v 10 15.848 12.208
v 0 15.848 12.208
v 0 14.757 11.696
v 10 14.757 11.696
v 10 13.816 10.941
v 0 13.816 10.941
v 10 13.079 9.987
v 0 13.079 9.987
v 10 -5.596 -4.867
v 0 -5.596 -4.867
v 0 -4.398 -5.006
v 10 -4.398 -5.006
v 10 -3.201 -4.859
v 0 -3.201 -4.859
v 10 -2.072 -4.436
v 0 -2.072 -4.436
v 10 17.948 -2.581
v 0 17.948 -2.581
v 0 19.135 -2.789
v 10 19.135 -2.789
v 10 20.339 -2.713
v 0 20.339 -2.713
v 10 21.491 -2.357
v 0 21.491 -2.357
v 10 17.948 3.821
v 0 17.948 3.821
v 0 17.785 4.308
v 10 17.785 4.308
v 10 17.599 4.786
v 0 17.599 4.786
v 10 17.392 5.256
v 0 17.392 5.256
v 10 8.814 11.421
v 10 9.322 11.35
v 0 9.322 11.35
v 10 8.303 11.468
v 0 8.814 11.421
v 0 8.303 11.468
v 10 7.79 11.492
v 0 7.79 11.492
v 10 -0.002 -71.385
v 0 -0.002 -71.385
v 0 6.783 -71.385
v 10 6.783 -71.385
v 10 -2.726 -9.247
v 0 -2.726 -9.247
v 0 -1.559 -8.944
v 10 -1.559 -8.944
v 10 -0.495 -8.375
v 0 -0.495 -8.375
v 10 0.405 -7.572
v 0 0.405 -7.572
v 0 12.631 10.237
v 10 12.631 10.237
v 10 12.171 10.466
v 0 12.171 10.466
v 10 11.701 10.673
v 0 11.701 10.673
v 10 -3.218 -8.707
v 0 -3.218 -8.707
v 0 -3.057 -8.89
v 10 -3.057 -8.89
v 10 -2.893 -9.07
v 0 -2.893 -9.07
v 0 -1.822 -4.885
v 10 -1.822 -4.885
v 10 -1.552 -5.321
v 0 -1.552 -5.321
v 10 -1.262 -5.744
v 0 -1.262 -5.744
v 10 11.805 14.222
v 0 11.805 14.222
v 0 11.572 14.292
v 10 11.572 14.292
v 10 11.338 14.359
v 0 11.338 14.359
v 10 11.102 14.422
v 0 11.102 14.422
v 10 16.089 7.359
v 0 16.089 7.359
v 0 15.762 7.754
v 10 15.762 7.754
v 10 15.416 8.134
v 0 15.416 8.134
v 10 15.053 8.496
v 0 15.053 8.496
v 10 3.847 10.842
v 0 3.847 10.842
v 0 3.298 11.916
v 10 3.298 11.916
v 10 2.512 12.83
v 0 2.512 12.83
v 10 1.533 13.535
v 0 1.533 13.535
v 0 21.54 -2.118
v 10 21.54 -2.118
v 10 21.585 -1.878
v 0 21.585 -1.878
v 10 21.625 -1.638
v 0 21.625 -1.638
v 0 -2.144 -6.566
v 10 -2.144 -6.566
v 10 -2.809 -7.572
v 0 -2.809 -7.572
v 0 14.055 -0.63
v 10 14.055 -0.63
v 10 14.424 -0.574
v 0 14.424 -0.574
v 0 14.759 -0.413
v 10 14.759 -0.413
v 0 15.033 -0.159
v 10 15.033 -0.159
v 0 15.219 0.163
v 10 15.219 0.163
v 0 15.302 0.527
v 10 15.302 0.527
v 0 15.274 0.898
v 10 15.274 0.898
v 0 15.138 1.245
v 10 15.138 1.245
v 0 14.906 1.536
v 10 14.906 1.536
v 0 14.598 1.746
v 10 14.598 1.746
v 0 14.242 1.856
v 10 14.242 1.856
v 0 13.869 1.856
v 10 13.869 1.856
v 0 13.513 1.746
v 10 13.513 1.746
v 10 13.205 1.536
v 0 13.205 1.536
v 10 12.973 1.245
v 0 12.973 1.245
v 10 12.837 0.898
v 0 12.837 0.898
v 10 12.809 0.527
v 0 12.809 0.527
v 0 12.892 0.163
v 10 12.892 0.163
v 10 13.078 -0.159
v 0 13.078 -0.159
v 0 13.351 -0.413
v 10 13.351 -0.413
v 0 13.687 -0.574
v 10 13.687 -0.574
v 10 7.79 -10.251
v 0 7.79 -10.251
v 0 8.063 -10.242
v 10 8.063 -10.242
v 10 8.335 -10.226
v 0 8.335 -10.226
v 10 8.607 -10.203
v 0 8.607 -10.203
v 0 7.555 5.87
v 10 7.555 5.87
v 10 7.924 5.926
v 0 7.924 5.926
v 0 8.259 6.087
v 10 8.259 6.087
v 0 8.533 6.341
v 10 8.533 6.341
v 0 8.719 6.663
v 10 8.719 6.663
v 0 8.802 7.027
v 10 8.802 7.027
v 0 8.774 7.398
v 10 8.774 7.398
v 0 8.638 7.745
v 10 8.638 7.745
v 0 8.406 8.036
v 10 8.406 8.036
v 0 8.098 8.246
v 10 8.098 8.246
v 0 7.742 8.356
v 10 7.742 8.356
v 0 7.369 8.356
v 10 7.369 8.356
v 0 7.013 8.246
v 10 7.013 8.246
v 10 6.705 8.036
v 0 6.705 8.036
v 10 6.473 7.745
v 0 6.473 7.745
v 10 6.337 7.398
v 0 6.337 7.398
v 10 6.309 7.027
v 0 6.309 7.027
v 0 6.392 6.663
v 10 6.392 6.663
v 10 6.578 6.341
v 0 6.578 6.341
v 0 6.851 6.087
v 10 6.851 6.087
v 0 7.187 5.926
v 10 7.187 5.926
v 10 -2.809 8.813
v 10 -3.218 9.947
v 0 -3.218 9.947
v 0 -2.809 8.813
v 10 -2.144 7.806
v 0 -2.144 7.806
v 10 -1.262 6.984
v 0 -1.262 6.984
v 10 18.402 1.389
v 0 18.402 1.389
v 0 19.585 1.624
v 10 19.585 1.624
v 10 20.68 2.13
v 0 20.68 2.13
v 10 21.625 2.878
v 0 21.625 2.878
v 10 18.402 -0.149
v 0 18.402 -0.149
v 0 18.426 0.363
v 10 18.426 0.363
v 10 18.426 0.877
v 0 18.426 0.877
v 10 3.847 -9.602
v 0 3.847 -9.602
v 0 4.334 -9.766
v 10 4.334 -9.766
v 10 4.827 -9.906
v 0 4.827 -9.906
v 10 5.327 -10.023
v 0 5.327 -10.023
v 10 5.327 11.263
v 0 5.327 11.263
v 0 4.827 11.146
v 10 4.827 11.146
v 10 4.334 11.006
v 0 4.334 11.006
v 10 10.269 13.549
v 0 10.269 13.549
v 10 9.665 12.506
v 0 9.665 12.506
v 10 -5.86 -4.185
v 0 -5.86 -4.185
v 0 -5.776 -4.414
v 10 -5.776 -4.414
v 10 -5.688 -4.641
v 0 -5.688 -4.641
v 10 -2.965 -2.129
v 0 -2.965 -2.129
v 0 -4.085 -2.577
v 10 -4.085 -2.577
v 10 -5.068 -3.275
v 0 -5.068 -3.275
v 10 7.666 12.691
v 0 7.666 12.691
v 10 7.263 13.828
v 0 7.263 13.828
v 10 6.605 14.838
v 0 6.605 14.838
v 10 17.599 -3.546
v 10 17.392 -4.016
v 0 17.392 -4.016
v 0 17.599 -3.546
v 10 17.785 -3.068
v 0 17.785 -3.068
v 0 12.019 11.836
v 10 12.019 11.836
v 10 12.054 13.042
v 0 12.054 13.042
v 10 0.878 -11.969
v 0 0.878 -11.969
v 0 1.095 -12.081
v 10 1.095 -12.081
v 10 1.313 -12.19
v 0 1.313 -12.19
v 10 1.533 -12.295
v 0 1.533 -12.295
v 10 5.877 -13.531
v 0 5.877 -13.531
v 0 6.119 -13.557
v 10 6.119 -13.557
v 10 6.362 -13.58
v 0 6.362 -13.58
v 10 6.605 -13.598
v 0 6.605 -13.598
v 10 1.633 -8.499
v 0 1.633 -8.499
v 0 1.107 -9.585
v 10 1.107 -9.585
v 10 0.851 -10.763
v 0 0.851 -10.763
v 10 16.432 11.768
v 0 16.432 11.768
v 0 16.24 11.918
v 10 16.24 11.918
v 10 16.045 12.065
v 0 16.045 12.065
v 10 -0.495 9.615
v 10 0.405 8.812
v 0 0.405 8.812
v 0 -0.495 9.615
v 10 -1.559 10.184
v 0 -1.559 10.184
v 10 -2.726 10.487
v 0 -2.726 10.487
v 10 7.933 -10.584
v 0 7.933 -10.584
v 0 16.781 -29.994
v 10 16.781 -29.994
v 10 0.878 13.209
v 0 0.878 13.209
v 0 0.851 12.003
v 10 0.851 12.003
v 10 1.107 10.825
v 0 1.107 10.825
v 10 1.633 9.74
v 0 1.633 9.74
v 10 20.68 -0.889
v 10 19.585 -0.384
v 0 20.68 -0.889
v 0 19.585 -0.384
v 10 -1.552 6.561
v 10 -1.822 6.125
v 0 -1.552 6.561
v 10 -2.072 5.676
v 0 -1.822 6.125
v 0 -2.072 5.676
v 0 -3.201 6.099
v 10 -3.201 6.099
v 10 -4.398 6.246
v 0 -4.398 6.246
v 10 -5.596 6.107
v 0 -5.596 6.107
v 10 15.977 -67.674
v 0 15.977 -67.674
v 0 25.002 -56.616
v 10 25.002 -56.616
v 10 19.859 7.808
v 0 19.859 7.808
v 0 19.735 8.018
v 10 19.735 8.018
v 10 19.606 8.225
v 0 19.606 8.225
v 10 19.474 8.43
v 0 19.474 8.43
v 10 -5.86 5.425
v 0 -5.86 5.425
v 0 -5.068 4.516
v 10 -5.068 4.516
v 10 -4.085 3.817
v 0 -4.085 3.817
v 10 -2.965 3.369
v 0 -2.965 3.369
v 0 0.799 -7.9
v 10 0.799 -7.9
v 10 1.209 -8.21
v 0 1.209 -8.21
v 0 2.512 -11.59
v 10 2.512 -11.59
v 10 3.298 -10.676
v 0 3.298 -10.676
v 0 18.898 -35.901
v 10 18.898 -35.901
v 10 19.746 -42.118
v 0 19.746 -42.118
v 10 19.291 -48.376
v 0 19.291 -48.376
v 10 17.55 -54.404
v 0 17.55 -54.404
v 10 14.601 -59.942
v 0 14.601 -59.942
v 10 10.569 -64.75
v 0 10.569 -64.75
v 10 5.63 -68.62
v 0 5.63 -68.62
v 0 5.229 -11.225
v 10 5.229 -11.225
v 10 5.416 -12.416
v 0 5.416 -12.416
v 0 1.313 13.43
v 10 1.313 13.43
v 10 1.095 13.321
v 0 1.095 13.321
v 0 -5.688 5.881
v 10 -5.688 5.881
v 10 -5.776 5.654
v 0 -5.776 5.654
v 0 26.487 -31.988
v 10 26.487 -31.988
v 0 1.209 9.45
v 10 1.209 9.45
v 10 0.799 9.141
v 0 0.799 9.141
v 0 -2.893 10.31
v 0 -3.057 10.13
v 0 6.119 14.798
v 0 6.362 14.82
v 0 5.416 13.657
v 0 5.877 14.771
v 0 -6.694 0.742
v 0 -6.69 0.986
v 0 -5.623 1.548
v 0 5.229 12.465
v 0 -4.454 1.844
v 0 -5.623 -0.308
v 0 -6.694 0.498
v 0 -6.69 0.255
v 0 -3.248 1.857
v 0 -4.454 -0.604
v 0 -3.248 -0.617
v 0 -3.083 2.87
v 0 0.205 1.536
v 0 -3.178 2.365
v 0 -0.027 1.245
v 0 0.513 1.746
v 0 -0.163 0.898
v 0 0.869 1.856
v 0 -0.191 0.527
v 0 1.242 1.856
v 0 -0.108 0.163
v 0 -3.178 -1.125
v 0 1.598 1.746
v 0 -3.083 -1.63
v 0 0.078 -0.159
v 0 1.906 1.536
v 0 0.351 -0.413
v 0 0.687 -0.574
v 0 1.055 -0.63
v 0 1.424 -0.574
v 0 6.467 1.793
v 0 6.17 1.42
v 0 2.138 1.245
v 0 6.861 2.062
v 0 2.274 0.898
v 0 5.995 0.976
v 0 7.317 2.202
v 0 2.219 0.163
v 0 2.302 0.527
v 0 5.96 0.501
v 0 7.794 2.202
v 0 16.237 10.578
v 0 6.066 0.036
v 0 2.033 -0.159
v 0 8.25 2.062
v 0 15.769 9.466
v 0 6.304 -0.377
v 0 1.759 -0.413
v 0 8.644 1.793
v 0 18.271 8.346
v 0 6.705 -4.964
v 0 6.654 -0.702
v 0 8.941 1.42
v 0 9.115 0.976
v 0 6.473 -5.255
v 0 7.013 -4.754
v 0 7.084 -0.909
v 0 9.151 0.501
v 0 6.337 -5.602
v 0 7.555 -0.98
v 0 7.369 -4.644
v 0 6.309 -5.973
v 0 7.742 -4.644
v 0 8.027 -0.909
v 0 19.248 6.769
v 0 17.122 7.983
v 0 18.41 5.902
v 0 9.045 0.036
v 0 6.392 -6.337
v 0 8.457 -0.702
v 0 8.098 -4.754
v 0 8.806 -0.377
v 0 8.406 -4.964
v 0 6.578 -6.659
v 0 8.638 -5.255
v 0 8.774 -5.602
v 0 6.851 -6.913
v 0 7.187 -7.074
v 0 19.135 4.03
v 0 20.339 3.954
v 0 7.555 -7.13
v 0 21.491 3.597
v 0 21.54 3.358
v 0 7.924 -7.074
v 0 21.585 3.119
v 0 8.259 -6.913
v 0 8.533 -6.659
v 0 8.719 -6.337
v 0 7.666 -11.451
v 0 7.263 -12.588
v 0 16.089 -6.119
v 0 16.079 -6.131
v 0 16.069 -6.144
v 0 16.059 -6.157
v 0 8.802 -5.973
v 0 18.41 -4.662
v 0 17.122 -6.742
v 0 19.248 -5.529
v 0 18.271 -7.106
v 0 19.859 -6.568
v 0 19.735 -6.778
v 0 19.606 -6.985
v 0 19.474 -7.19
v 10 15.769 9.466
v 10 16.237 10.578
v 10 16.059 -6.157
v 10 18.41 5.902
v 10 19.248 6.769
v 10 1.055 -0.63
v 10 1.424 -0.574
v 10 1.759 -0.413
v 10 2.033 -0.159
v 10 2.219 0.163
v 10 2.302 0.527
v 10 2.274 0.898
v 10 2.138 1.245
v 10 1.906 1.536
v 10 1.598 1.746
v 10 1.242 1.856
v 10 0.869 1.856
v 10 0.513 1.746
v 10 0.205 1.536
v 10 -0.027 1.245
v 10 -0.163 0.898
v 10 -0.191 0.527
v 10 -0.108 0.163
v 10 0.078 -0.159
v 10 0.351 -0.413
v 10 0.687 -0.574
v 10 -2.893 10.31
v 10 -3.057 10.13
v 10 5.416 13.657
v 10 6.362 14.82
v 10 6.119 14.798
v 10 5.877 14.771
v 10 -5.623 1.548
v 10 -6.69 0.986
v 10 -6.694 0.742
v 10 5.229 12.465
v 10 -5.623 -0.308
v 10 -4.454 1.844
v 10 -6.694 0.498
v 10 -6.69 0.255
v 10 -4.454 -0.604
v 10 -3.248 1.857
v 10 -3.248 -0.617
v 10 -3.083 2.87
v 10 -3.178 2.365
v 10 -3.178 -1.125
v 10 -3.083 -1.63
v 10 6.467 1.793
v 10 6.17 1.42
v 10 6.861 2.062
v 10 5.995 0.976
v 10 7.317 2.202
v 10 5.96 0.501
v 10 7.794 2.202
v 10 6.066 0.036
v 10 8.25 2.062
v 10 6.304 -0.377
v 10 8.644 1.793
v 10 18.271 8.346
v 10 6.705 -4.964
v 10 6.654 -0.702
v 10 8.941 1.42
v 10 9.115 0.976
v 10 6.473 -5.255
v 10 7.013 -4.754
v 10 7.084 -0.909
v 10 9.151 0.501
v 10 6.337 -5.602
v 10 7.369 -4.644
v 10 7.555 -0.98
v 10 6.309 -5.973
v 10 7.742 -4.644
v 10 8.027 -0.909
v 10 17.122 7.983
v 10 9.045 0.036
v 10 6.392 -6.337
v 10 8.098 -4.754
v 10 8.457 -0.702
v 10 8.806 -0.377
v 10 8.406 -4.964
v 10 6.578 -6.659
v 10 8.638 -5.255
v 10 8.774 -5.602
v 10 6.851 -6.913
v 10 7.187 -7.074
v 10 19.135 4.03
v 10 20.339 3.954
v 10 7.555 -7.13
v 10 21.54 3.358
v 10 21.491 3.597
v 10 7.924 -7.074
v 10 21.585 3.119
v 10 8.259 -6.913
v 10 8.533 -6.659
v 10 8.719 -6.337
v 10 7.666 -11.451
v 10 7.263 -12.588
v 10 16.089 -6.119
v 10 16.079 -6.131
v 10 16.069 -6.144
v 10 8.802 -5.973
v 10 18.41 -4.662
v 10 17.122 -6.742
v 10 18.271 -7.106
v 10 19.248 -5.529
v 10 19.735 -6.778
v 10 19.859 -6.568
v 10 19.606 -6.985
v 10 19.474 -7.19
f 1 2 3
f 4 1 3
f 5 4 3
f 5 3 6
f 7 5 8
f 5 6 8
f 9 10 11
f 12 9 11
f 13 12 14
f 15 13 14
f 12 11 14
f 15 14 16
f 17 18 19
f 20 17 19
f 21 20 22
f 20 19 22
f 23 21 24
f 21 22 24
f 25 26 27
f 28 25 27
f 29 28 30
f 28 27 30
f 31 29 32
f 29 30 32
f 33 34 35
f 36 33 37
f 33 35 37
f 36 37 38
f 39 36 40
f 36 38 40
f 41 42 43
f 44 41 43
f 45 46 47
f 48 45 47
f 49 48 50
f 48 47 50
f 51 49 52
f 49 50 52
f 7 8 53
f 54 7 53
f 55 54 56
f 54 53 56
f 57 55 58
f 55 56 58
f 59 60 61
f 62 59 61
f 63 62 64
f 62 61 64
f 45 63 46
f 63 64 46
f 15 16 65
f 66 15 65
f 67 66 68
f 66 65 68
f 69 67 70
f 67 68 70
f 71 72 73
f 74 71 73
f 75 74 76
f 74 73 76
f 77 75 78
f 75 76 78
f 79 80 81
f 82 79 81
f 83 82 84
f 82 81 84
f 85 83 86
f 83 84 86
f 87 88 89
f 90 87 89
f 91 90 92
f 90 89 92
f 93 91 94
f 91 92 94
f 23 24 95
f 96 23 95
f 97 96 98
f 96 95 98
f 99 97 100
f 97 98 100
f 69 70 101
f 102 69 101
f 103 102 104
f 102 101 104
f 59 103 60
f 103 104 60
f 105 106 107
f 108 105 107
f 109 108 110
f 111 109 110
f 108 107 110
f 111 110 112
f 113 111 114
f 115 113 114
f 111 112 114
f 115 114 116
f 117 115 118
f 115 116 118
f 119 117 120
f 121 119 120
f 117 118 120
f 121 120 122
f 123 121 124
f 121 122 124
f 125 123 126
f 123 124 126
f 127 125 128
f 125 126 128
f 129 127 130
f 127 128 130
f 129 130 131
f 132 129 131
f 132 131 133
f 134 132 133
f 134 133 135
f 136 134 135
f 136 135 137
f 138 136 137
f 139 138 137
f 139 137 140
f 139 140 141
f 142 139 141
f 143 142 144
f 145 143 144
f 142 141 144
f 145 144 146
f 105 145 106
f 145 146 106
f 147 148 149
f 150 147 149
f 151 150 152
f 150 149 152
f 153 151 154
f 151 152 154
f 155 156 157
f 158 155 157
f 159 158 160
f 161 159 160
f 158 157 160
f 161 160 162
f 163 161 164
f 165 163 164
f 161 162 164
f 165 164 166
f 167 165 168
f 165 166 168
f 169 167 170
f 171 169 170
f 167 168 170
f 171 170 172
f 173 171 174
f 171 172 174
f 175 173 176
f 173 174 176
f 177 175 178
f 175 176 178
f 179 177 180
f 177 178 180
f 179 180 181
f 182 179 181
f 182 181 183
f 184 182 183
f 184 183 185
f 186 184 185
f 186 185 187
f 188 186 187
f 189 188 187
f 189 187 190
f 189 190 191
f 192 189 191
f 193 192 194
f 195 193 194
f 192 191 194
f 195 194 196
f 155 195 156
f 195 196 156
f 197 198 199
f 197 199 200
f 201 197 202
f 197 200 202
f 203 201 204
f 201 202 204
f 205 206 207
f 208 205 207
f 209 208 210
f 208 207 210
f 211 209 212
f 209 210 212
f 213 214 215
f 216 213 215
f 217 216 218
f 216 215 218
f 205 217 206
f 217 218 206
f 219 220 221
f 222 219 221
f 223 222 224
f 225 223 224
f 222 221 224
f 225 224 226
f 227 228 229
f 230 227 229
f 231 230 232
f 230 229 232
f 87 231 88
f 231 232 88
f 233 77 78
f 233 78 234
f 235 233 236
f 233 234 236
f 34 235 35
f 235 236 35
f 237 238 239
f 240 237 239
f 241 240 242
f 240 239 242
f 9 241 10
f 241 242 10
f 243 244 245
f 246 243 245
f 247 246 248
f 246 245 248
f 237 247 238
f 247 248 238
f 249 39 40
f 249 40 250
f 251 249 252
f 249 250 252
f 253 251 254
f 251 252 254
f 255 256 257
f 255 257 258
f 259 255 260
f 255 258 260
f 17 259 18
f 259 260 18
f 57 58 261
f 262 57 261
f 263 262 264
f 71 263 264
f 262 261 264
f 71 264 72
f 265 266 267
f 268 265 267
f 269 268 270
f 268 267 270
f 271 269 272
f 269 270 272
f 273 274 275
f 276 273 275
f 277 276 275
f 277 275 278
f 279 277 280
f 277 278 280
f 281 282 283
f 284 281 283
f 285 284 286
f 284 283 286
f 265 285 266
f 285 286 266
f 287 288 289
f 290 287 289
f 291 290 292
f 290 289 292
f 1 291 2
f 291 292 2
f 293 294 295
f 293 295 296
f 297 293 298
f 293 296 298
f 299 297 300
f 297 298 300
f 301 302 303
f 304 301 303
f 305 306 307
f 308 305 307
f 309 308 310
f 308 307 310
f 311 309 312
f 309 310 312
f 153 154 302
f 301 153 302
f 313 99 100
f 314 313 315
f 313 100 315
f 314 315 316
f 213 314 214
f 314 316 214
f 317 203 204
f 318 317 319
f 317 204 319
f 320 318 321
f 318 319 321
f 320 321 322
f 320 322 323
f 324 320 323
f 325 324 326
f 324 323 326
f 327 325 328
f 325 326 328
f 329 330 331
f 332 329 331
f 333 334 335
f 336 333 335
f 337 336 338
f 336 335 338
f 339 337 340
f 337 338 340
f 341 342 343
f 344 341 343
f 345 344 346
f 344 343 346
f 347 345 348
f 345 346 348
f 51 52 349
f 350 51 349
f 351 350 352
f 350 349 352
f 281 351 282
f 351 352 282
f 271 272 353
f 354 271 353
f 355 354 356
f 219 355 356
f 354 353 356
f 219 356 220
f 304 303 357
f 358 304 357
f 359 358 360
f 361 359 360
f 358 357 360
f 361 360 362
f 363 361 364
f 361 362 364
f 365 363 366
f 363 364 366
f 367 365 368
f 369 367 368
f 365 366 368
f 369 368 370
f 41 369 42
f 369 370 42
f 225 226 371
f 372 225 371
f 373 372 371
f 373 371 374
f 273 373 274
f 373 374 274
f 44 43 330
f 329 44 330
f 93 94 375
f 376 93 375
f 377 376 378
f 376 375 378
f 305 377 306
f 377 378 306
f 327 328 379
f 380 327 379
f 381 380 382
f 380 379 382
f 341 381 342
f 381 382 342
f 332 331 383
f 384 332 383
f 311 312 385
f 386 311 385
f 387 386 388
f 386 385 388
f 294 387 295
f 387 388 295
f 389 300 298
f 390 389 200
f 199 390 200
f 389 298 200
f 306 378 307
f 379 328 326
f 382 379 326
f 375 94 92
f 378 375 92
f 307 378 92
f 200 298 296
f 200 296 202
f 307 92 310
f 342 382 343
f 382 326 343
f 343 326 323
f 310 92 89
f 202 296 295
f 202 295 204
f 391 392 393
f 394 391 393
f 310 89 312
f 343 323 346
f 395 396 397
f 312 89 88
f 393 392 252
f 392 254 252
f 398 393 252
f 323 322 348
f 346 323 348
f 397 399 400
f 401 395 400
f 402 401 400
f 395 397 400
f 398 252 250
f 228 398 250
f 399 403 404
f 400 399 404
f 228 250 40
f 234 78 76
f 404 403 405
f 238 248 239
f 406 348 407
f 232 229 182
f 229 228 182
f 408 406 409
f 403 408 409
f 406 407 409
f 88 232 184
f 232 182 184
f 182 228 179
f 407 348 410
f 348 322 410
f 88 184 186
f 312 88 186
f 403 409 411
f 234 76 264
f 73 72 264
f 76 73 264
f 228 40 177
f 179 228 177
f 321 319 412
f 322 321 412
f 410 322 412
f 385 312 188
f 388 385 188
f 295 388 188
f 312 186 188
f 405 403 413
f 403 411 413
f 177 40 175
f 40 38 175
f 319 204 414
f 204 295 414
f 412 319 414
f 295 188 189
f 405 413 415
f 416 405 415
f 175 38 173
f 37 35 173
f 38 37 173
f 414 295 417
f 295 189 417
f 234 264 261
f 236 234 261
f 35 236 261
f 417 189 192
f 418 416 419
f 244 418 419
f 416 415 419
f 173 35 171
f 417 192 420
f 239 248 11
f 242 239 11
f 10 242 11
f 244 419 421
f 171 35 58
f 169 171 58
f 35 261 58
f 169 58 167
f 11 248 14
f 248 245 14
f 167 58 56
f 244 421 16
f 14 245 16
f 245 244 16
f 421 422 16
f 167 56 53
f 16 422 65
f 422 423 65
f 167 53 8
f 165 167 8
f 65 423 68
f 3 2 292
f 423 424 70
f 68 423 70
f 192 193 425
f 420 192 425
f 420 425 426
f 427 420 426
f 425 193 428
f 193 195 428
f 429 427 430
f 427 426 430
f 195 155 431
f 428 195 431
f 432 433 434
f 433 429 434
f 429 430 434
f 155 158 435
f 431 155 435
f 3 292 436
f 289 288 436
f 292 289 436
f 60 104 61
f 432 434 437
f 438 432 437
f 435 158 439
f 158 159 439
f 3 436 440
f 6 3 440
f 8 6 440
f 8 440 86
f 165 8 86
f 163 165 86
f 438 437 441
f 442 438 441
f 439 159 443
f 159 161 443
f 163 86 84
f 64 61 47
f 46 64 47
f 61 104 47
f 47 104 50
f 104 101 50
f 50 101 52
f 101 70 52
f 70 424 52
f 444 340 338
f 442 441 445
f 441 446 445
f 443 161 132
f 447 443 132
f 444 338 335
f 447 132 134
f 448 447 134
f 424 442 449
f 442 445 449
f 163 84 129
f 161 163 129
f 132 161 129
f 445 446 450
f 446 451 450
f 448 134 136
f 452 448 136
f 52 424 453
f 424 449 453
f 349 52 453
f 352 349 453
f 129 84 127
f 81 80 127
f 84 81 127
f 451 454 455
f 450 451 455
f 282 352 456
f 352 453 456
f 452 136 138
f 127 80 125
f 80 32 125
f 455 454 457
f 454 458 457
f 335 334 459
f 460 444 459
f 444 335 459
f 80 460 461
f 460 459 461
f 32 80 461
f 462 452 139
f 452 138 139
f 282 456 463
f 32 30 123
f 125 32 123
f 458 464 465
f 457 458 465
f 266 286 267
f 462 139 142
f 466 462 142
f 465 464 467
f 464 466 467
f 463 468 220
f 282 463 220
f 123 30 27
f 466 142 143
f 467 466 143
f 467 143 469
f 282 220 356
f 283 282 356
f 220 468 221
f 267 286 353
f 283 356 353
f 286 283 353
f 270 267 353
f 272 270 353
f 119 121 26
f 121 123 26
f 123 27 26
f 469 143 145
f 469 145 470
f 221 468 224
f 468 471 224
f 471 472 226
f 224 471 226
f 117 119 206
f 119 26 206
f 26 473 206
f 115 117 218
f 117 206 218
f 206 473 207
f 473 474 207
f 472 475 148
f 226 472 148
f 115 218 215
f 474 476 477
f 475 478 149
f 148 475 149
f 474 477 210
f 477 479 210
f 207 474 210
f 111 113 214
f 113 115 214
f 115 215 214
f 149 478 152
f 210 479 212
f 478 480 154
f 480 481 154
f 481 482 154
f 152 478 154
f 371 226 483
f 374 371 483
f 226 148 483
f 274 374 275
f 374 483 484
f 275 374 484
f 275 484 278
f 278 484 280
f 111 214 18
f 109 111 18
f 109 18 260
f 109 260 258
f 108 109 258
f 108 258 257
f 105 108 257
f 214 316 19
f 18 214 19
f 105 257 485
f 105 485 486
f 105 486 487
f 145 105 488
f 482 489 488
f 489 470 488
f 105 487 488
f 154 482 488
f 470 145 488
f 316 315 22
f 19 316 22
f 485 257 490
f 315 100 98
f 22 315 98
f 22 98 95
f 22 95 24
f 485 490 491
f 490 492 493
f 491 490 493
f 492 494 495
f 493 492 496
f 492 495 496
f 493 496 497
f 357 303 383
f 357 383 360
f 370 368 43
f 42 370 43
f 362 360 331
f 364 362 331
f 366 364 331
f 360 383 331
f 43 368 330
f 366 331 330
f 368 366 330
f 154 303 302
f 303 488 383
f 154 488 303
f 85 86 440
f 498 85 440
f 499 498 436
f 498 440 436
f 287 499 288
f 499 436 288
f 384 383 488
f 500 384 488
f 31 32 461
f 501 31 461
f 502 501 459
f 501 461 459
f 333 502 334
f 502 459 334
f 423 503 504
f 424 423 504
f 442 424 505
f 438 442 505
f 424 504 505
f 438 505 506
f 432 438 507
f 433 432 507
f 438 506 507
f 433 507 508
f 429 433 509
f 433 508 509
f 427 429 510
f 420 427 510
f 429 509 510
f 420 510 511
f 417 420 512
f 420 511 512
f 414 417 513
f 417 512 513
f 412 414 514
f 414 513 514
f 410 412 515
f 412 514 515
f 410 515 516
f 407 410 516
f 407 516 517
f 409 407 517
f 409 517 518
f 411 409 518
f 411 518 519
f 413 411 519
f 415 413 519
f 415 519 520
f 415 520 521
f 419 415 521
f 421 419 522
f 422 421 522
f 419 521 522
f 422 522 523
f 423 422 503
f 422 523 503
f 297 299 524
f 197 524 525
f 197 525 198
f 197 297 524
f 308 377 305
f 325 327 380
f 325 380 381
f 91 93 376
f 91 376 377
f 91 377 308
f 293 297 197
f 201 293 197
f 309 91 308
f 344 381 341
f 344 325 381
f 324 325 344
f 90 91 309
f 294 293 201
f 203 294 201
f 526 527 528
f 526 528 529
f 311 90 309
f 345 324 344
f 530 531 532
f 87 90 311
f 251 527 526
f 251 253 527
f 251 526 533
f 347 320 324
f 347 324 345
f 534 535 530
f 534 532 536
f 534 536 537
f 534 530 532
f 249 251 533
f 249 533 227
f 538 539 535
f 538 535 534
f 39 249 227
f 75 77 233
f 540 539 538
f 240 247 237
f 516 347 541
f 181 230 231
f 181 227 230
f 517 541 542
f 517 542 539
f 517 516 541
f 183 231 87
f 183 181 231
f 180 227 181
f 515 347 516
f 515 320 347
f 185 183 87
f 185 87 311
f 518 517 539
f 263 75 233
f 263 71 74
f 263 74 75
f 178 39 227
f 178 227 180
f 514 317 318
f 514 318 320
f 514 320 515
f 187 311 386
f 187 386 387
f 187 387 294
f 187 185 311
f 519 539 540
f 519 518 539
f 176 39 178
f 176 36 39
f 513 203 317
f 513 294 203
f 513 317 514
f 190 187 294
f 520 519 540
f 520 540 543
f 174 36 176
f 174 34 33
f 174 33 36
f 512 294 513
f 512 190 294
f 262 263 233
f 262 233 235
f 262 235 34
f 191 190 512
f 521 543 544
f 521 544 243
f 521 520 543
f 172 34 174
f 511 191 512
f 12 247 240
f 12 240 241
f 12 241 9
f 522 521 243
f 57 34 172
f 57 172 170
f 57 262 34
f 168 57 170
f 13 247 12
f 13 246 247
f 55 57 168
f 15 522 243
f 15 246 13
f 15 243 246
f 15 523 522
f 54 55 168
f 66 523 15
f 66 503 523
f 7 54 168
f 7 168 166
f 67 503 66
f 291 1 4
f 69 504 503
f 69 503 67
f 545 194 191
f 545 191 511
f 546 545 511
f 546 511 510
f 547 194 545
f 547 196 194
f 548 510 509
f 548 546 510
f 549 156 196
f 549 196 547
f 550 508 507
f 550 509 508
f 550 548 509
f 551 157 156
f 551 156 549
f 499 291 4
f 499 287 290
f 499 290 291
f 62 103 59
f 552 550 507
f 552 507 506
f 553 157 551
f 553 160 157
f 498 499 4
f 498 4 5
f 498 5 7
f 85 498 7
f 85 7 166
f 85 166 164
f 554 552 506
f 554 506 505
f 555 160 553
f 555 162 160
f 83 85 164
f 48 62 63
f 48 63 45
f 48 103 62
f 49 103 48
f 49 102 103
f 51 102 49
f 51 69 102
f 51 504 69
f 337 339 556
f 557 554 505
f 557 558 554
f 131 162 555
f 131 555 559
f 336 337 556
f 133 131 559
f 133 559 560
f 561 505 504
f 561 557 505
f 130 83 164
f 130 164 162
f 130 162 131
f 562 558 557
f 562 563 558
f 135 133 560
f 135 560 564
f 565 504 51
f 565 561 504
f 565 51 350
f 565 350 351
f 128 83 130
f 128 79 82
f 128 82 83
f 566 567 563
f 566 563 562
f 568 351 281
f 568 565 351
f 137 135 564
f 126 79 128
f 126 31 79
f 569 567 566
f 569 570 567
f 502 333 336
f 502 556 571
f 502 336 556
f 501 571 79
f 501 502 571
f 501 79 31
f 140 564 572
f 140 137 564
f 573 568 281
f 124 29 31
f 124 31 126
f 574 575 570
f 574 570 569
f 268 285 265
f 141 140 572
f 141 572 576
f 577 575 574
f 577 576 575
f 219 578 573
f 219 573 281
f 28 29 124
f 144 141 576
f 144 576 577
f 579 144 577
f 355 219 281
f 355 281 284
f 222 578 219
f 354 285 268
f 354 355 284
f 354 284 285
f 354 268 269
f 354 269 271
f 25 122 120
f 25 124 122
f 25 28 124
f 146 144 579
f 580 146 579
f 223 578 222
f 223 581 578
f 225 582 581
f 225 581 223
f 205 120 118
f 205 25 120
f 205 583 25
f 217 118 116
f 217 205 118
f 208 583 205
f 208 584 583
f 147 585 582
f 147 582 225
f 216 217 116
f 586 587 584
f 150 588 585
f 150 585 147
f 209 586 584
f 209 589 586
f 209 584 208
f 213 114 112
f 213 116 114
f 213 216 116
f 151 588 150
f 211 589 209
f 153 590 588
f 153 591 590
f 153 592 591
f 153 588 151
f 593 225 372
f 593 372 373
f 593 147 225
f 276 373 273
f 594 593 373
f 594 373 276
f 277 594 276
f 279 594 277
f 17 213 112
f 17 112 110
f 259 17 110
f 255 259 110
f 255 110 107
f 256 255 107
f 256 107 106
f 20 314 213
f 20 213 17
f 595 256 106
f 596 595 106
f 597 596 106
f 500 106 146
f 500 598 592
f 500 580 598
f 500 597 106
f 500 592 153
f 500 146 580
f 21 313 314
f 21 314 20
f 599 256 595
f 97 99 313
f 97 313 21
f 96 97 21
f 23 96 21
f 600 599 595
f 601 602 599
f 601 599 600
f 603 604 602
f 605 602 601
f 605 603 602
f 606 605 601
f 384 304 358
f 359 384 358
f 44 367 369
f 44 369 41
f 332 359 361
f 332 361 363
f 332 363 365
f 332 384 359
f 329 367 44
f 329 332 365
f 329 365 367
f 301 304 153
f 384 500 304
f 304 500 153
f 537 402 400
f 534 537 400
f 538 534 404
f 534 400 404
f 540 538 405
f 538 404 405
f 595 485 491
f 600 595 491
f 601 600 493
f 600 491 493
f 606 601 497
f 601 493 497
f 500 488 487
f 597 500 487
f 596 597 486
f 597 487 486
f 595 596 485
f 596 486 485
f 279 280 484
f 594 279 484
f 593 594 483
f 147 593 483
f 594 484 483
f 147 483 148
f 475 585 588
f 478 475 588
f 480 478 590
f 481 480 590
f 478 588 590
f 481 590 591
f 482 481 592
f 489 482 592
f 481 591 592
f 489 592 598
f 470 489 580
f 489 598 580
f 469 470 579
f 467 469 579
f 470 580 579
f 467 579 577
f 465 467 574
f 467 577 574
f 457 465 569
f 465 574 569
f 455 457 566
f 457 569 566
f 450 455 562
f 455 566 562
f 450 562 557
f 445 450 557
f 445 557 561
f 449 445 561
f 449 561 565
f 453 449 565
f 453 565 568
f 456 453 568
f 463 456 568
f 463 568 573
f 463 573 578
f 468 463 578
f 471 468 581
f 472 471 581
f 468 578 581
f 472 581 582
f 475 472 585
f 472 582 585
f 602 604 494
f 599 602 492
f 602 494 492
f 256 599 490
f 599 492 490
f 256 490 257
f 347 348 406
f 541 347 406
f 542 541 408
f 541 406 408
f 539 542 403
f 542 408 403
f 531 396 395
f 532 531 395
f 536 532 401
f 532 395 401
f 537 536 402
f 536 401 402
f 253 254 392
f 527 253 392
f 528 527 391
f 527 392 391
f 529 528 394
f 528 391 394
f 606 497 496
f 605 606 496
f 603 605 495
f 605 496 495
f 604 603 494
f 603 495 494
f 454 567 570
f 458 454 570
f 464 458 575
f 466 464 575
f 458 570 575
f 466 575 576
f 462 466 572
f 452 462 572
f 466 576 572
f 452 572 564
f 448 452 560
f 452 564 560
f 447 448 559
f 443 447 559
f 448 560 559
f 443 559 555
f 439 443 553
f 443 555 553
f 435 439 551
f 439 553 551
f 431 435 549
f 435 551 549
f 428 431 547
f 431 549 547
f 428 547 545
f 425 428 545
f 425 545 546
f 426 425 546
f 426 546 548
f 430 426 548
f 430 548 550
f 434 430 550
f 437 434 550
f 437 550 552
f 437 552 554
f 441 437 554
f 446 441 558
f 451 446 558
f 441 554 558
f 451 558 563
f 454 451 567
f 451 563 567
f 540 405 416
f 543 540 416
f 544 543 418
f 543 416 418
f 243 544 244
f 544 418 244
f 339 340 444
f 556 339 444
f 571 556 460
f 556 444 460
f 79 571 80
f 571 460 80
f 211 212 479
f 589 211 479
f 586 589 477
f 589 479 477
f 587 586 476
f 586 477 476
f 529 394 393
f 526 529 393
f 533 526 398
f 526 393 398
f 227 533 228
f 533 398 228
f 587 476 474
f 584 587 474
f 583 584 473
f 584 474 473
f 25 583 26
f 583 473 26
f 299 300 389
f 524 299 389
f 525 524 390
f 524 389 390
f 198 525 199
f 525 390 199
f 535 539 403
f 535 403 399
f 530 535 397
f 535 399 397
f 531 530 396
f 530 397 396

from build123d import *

# Parameters (mm, degrees)
EXTRUDE_1_DEPTH     = 10
SKETCH_2_R          = 1.724202643
CUT_EXTRUDE_1_DEPTH = 10
EXTRUDE_4_DEPTH     = 10
SKETCH_9_R          = 1.6
CUT_EXTRUDE_2_DEPTH = 10
SKETCH_11_R         = 1.25
CUT_EXTRUDE_3_DEPTH = 10
EXTRUDE_6_DEPTH     = 10


with BuildPart() as part:
    # 草图1 → 凸台-拉伸1 (new body)
    with BuildSketch(Plane(origin=(0, 0, 0), x_dir=(0, 0, -1), z_dir=(1, 0, 0))):
        with BuildLine():
            ThreePointArc((-14.42168225, 11.102084181), (-13.045532431, 9.936188758), (-11.349614776, 9.322215004))
            ThreePointArc((-11.349614776, 9.322215004), (-11.447736293, 8.558657104), (-11.491588877, 7.790070448))
            ThreePointArc((-11.491588877, 7.790070448), (-13.271447693, 7.498174815), (-14.838398668, 6.604997843))
            ThreePointArc((-14.838398668, 6.604997843), (-14.809334872, 6.240506841), (-14.770928756, 5.876881533))
            ThreePointArc((-14.770928756, 5.876881533), (-13.066537261, 5.286839082), (-11.263348242, 5.326961726))
            ThreePointArc((-11.263348242, 5.326961726), (-11.079014904, 4.57951961), (-10.842260697, 3.846992516))
            ThreePointArc((-10.842260697, 3.846992516), (-12.396484749, 2.93184878), (-13.534970281, 1.532938077))
            ThreePointArc((-13.534970281, 1.532938077), (-13.376199762, 1.203559394), (-13.209030512, 0.878362781))
            ThreePointArc((-13.209030512, 0.878362781), (-11.406584857, 0.943861805), (-9.739655144, 1.632662062))
            ThreePointArc((-9.739655144, 1.632662062), (-9.297762189, 1.002281928), (-8.812376158, 0.404746239))
            ThreePointArc((-8.812376158, 0.404746239), (-9.931058878, -1.010050366), (-10.487320186, -2.725764159))
            ThreePointArc((-10.487320186, -2.725764159), (-10.220285782, -2.975546107), (-9.946930533, -3.218394419))
            ThreePointArc((-9.946930533, -3.218394419), (-8.289860991, -2.506199926), (-6.984318678, -1.261748348))
            ThreePointArc((-6.984318678, -1.261748348), (-6.344546199, -1.68993017), (-5.676082417, -2.071773947))
            ThreePointArc((-5.676082417, -2.071773947), (-6.208139503, -3.795147302), (-6.107050417, -5.595947529))
            ThreePointArc((-6.107050417, -5.595947529), (-5.767816603, -5.732398305), (-5.425193496, -5.860100307))
            ThreePointArc((-5.425193496, -5.860100307), (-4.137296491, -4.597396158), (-3.369462301, -2.96536334))
            ThreePointArc((-3.369462301, -2.96536334), (-2.618215116, -3.133518522), (-1.856953321, -3.24810027))
            ThreePointArc((-1.856953321, -3.24810027), (-1.730527517, -5.047299252), (-0.985740676, -6.689977865))
            ThreePointArc((-0.985740676, -6.689977865), (-0.62012286, -6.694669036), (-0.254505043, -6.689977865))
            ThreePointArc((-0.254505043, -6.689977865), (0.490281797, -5.047299252), (0.616707602, -3.24810027))
            ThreePointArc((0.616707602, -3.24810027), (1.377969397, -3.133518522), (2.129216582, -2.96536334))
            ThreePointArc((2.129216582, -2.96536334), (2.897050772, -4.597396158), (4.184947776, -5.860100307))
            ThreePointArc((4.184947776, -5.860100307), (4.527570883, -5.732398305), (4.866804697, -5.595947529))
            ThreePointArc((4.866804697, -5.595947529), (4.967893784, -3.795147302), (4.435836697, -2.071773947))
            ThreePointArc((4.435836697, -2.071773947), (5.104300479, -1.68993017), (5.744072958, -1.261748348))
            ThreePointArc((5.744072958, -1.261748348), (7.049615272, -2.506199926), (8.706684814, -3.218394419))
            ThreePointArc((8.706684814, -3.218394419), (8.980040062, -2.975546107), (9.247074467, -2.725764159))
            ThreePointArc((9.247074467, -2.725764159), (8.690813158, -1.010050366), (7.572130439, 0.404746239))
            ThreePointArc((7.572130439, 0.404746239), (8.05751647, 1.002281928), (8.499409425, 1.632662062))
            ThreePointArc((8.499409425, 1.632662062), (10.166339138, 0.943861805), (11.968784793, 0.878362781))
            ThreePointArc((11.968784793, 0.878362781), (12.135954042, 1.203559394), (12.294724562, 1.532938077))
            ThreePointArc((12.294724562, 1.532938077), (11.15623903, 2.93184878), (9.602014977, 3.846992516))
            ThreePointArc((9.602014977, 3.846992516), (9.838769184, 4.57951961), (10.023102523, 5.326961726))
            ThreePointArc((10.023102523, 5.326961726), (11.826291541, 5.286839082), (13.530683036, 5.876881533))
            ThreePointArc((13.530683036, 5.876881533), (13.569089153, 6.240506841), (13.598152949, 6.604997843))
            ThreePointArc((13.598152949, 6.604997843), (12.031201973, 7.498174815), (10.251343158, 7.790070448))
            ThreePointArc((10.251343158, 7.790070448), (10.207490573, 8.558657104), (10.109369057, 9.322215004))
            ThreePointArc((10.109369057, 9.322215004), (11.805286712, 9.936188758), (13.181436531, 11.102084181))
            ThreePointArc((13.181436531, 11.102084181), (13.085892556, 11.455028572), (12.981324401, 11.805405363))
            ThreePointArc((12.981324401, 11.805405363), (11.197533394, 12.072220104), (9.432419612, 11.701445512))
            ThreePointArc((9.432419612, 11.701445512), (9.11388277, 12.402289844), (8.746558253, 13.078840801))
            ThreePointArc((8.746558253, 13.078840801), (10.106161468, 14.263990395), (10.968212953, 15.848278153))
            ThreePointArc((10.968212953, 15.848278153), (10.751622629, 16.142874532), (10.527545033, 16.431816785))
            ThreePointArc((10.527545033, 16.431816785), (8.767824855, 16.036234486), (7.255844503, 15.052864832))
            ThreePointArc((7.255844503, 15.052864832), (6.705643569, 15.591313929), (6.118725263, 16.089485988))
            ThreePointArc((6.118725263, 16.089485988), (6.95839209, 17.685750403), (7.18992041, 19.474463655))
            ThreePointArc((7.18992041, 19.474463655), (6.881535461, 19.670925148), (6.568211345, 19.859409611))
            ThreePointArc((6.568211345, 19.859409611), (5.070221956, 18.854855853), (4.015576359, 17.391700658))
            ThreePointArc((4.015576359, 17.391700658), (3.308019018, 17.695033986), (2.580773493, 17.947546249))
            ThreePointArc((2.580773493, 17.947546249), (2.787102273, 19.73934113), (2.356838247, 21.490904241))
            ThreePointArc((2.356838247, 21.490904241), (1.998307769, 21.562697634), (1.63805329, 21.625268436))
            ThreePointArc((1.63805329, 21.625268436), (0.604106458, 20.147413771), (0.149231348, 18.402080251))
            ThreePointArc((0.149231348, 18.402080251), (-0.62012286, 18.429330964), (-1.389477067, 18.402080251))
            ThreePointArc((-1.389477067, 18.402080251), (-1.844352177, 20.147413771), (-2.87829901, 21.625268436))
            ThreePointArc((-2.87829901, 21.625268436), (-3.238553489, 21.562697634), (-3.597083966, 21.490904241))
            ThreePointArc((-3.597083966, 21.490904241), (-4.027347993, 19.73934113), (-3.821019212, 17.947546249))
            ThreePointArc((-3.821019212, 17.947546249), (-4.548264738, 17.695033986), (-5.255822078, 17.391700658))
            ThreePointArc((-5.255822078, 17.391700658), (-6.310467675, 18.854855853), (-7.808457064, 19.859409611))
            ThreePointArc((-7.808457064, 19.859409611), (-8.121781181, 19.670925148), (-8.43016613, 19.474463655))
            ThreePointArc((-8.43016613, 19.474463655), (-8.198637809, 17.685750403), (-7.358970983, 16.089485988))
            ThreePointArc((-7.358970983, 16.089485988), (-7.945889289, 15.591313929), (-8.496090222, 15.052864832))
            ThreePointArc((-8.496090222, 15.052864832), (-10.008070574, 16.036234486), (-11.767790753, 16.431816785))
            ThreePointArc((-11.767790753, 16.431816785), (-11.991868348, 16.142874532), (-12.208458672, 15.848278153))
            ThreePointArc((-12.208458672, 15.848278153), (-11.346407187, 14.263990395), (-9.986803973, 13.078840801))
            ThreePointArc((-9.986803973, 13.078840801), (-10.35412849, 12.402289844), (-10.672665332, 11.701445512))
            ThreePointArc((-10.672665332, 11.701445512), (-12.437779114, 12.072220104), (-14.221570121, 11.805405363))
            ThreePointArc((-14.221570121, 11.805405363), (-14.326138275, 11.455028572), (-14.42168225, 11.102084181))
        make_face()
    extrude(amount=EXTRUDE_1_DEPTH)

    # 草图2 → 切除-拉伸1 (cut)
    with BuildSketch(Plane(origin=(10, 0, 0), x_dir=(0, 0, -1), z_dir=(1, 0, 0))):
        with Locations((-0.62012286, 7.555330964)):
            Circle(SKETCH_2_R)
    extrude(amount=-CUT_EXTRUDE_1_DEPTH, mode=Mode.SUBTRACT)

    # 草图1<2> → 凸台-拉伸4 (add)
    with BuildSketch(Plane(origin=(0, 0, 0), x_dir=(0, 0, -1), z_dir=(1, 0, 0))):
        with BuildLine():
            ThreePointArc((-14.42168225, 11.102084181), (-13.045532431, 9.936188758), (-11.349614776, 9.322215004))
            ThreePointArc((-11.349614776, 9.322215004), (-11.447736293, 8.558657104), (-11.491588877, 7.790070448))
            ThreePointArc((-11.491588877, 7.790070448), (-13.271447693, 7.498174815), (-14.838398668, 6.604997843))
            ThreePointArc((-14.838398668, 6.604997843), (-14.809334872, 6.240506841), (-14.770928756, 5.876881533))
            ThreePointArc((-14.770928756, 5.876881533), (-13.066537261, 5.286839082), (-11.263348242, 5.326961726))
            ThreePointArc((-11.263348242, 5.326961726), (-11.079014904, 4.57951961), (-10.842260697, 3.846992516))
            ThreePointArc((-10.842260697, 3.846992516), (-12.396484749, 2.93184878), (-13.534970281, 1.532938077))
            ThreePointArc((-13.534970281, 1.532938077), (-13.376199762, 1.203559394), (-13.209030512, 0.878362781))
            ThreePointArc((-13.209030512, 0.878362781), (-11.406584857, 0.943861805), (-9.739655144, 1.632662062))
            ThreePointArc((-9.739655144, 1.632662062), (-9.297762189, 1.002281928), (-8.812376158, 0.404746239))
            ThreePointArc((-8.812376158, 0.404746239), (-9.931058878, -1.010050366), (-10.487320186, -2.725764159))
            ThreePointArc((-10.487320186, -2.725764159), (-10.220285782, -2.975546107), (-9.946930533, -3.218394419))
            ThreePointArc((-9.946930533, -3.218394419), (-8.289860991, -2.506199926), (-6.984318678, -1.261748348))
            ThreePointArc((-6.984318678, -1.261748348), (-6.344546199, -1.68993017), (-5.676082417, -2.071773947))
            ThreePointArc((-5.676082417, -2.071773947), (-6.208139503, -3.795147302), (-6.107050417, -5.595947529))
            ThreePointArc((-6.107050417, -5.595947529), (-5.767816603, -5.732398305), (-5.425193496, -5.860100307))
            ThreePointArc((-5.425193496, -5.860100307), (-4.137296491, -4.597396158), (-3.369462301, -2.96536334))
            ThreePointArc((-3.369462301, -2.96536334), (-2.618215116, -3.133518522), (-1.856953321, -3.24810027))
            ThreePointArc((-1.856953321, -3.24810027), (-1.730527517, -5.047299252), (-0.985740676, -6.689977865))
            ThreePointArc((-0.985740676, -6.689977865), (-0.62012286, -6.694669036), (-0.254505043, -6.689977865))
            ThreePointArc((-0.254505043, -6.689977865), (0.490281797, -5.047299252), (0.616707602, -3.24810027))
            ThreePointArc((0.616707602, -3.24810027), (1.377969397, -3.133518522), (2.129216582, -2.96536334))
            ThreePointArc((2.129216582, -2.96536334), (2.897050772, -4.597396158), (4.184947776, -5.860100307))
            ThreePointArc((4.184947776, -5.860100307), (4.527570883, -5.732398305), (4.866804697, -5.595947529))
            ThreePointArc((4.866804697, -5.595947529), (4.967893784, -3.795147302), (4.435836697, -2.071773947))
            ThreePointArc((4.435836697, -2.071773947), (5.104300479, -1.68993017), (5.744072958, -1.261748348))
            ThreePointArc((5.744072958, -1.261748348), (7.049615272, -2.506199926), (8.706684814, -3.218394419))
            ThreePointArc((8.706684814, -3.218394419), (8.980040062, -2.975546107), (9.247074467, -2.725764159))
            ThreePointArc((9.247074467, -2.725764159), (8.690813158, -1.010050366), (7.572130439, 0.404746239))
            ThreePointArc((7.572130439, 0.404746239), (8.05751647, 1.002281928), (8.499409425, 1.632662062))
            ThreePointArc((8.499409425, 1.632662062), (10.166339138, 0.943861805), (11.968784793, 0.878362781))
            ThreePointArc((11.968784793, 0.878362781), (12.135954042, 1.203559394), (12.294724562, 1.532938077))
            ThreePointArc((12.294724562, 1.532938077), (11.15623903, 2.93184878), (9.602014977, 3.846992516))
            ThreePointArc((9.602014977, 3.846992516), (9.838769184, 4.57951961), (10.023102523, 5.326961726))
            ThreePointArc((10.023102523, 5.326961726), (11.826291541, 5.286839082), (13.530683036, 5.876881533))
            ThreePointArc((13.530683036, 5.876881533), (13.569089153, 6.240506841), (13.598152949, 6.604997843))
            ThreePointArc((13.598152949, 6.604997843), (12.031201973, 7.498174815), (10.251343158, 7.790070448))
            ThreePointArc((10.251343158, 7.790070448), (10.207490573, 8.558657104), (10.109369057, 9.322215004))
            ThreePointArc((10.109369057, 9.322215004), (11.805286712, 9.936188758), (13.181436531, 11.102084181))
            ThreePointArc((13.181436531, 11.102084181), (13.085892556, 11.455028572), (12.981324401, 11.805405363))
            ThreePointArc((12.981324401, 11.805405363), (11.197533394, 12.072220104), (9.432419612, 11.701445512))
            ThreePointArc((9.432419612, 11.701445512), (9.11388277, 12.402289844), (8.746558253, 13.078840801))
            ThreePointArc((8.746558253, 13.078840801), (10.106161468, 14.263990395), (10.968212953, 15.848278153))
            ThreePointArc((10.968212953, 15.848278153), (10.751622629, 16.142874532), (10.527545033, 16.431816785))
            ThreePointArc((10.527545033, 16.431816785), (8.767824855, 16.036234486), (7.255844503, 15.052864832))
            ThreePointArc((7.255844503, 15.052864832), (6.705643569, 15.591313929), (6.118725263, 16.089485988))
            ThreePointArc((6.118725263, 16.089485988), (6.95839209, 17.685750403), (7.18992041, 19.474463655))
            ThreePointArc((7.18992041, 19.474463655), (6.881535461, 19.670925148), (6.568211345, 19.859409611))
            ThreePointArc((6.568211345, 19.859409611), (5.070221956, 18.854855853), (4.015576359, 17.391700658))
            ThreePointArc((4.015576359, 17.391700658), (3.308019018, 17.695033986), (2.580773493, 17.947546249))
            ThreePointArc((2.580773493, 17.947546249), (2.787102273, 19.73934113), (2.356838247, 21.490904241))
            ThreePointArc((2.356838247, 21.490904241), (1.998307769, 21.562697634), (1.63805329, 21.625268436))
            ThreePointArc((1.63805329, 21.625268436), (0.604106458, 20.147413771), (0.149231348, 18.402080251))
            ThreePointArc((0.149231348, 18.402080251), (-0.62012286, 18.429330964), (-1.389477067, 18.402080251))
            ThreePointArc((-1.389477067, 18.402080251), (-1.844352177, 20.147413771), (-2.87829901, 21.625268436))
            ThreePointArc((-2.87829901, 21.625268436), (-3.238553489, 21.562697634), (-3.597083966, 21.490904241))
            ThreePointArc((-3.597083966, 21.490904241), (-4.027347993, 19.73934113), (-3.821019212, 17.947546249))
            ThreePointArc((-3.821019212, 17.947546249), (-4.548264738, 17.695033986), (-5.255822078, 17.391700658))
            ThreePointArc((-5.255822078, 17.391700658), (-6.310467675, 18.854855853), (-7.808457064, 19.859409611))
            ThreePointArc((-7.808457064, 19.859409611), (-8.121781181, 19.670925148), (-8.43016613, 19.474463655))
            ThreePointArc((-8.43016613, 19.474463655), (-8.198637809, 17.685750403), (-7.358970983, 16.089485988))
            ThreePointArc((-7.358970983, 16.089485988), (-7.945889289, 15.591313929), (-8.496090222, 15.052864832))
            ThreePointArc((-8.496090222, 15.052864832), (-10.008070574, 16.036234486), (-11.767790753, 16.431816785))
            ThreePointArc((-11.767790753, 16.431816785), (-11.991868348, 16.142874532), (-12.208458672, 15.848278153))
            ThreePointArc((-12.208458672, 15.848278153), (-11.346407187, 14.263990395), (-9.986803973, 13.078840801))
            ThreePointArc((-9.986803973, 13.078840801), (-10.35412849, 12.402289844), (-10.672665332, 11.701445512))
            ThreePointArc((-10.672665332, 11.701445512), (-12.437779114, 12.072220104), (-14.221570121, 11.805405363))
            ThreePointArc((-14.221570121, 11.805405363), (-14.326138275, 11.455028572), (-14.42168225, 11.102084181))
        make_face()
    extrude(amount=EXTRUDE_4_DEPTH)

    # 草图9 → 切除-拉伸2 (cut)
    with BuildSketch(Plane(origin=(10, 0, 0), x_dir=(0, 0, -1), z_dir=(1, 0, 0))):
        with Locations((-0.62012286, 7.555330964)):
            Circle(SKETCH_9_R)
    extrude(amount=-CUT_EXTRUDE_2_DEPTH, mode=Mode.SUBTRACT)

    # 草图11 → 切除-拉伸3 (cut)
    with BuildSketch(Plane(origin=(10, 0, 0), x_dir=(0, 0, -1), z_dir=(1, 0, 0))):
        with Locations((-0.62012286, 14.055330964)):
            Circle(SKETCH_11_R)
        with Locations((5.87987714, 7.555330964)):
            Circle(SKETCH_11_R)
        with Locations((-0.62012286, 1.055330964)):
            Circle(SKETCH_11_R)
        with Locations((-7.12012286, 7.555330964)):
            Circle(SKETCH_11_R)
    extrude(amount=-CUT_EXTRUDE_3_DEPTH, mode=Mode.SUBTRACT)

    # 草图16 → 凸台-拉伸6 (add)
    with BuildSketch(Plane.ZY):
        with BuildLine():
            Line((-10.583770646, 7.933190096), (-29.994013507, 16.781424296))
            ThreePointArc((-29.994013507, 16.781424296), (-54.404174999, 17.550380418), (-71.385236253, -0.002136105))
            Line((-71.385236253, -0.002136105), (-71.385236253, 6.782613007))
            Line((-71.385236253, 6.782613007), (-67.673564574, 15.976855456))
            Line((-67.673564574, 15.976855456), (-56.616482475, 25.001560632))
            Line((-56.616482475, 25.001560632), (-31.988164712, 26.487244509))
            Line((-31.988164712, 26.487244509), (-6.022868168, 16.005178547))
            Line((-6.022868168, 16.005178547), (-10.583770646, 7.933190096))
        make_face()
    extrude(amount=-EXTRUDE_6_DEPTH)


solid = part.part
